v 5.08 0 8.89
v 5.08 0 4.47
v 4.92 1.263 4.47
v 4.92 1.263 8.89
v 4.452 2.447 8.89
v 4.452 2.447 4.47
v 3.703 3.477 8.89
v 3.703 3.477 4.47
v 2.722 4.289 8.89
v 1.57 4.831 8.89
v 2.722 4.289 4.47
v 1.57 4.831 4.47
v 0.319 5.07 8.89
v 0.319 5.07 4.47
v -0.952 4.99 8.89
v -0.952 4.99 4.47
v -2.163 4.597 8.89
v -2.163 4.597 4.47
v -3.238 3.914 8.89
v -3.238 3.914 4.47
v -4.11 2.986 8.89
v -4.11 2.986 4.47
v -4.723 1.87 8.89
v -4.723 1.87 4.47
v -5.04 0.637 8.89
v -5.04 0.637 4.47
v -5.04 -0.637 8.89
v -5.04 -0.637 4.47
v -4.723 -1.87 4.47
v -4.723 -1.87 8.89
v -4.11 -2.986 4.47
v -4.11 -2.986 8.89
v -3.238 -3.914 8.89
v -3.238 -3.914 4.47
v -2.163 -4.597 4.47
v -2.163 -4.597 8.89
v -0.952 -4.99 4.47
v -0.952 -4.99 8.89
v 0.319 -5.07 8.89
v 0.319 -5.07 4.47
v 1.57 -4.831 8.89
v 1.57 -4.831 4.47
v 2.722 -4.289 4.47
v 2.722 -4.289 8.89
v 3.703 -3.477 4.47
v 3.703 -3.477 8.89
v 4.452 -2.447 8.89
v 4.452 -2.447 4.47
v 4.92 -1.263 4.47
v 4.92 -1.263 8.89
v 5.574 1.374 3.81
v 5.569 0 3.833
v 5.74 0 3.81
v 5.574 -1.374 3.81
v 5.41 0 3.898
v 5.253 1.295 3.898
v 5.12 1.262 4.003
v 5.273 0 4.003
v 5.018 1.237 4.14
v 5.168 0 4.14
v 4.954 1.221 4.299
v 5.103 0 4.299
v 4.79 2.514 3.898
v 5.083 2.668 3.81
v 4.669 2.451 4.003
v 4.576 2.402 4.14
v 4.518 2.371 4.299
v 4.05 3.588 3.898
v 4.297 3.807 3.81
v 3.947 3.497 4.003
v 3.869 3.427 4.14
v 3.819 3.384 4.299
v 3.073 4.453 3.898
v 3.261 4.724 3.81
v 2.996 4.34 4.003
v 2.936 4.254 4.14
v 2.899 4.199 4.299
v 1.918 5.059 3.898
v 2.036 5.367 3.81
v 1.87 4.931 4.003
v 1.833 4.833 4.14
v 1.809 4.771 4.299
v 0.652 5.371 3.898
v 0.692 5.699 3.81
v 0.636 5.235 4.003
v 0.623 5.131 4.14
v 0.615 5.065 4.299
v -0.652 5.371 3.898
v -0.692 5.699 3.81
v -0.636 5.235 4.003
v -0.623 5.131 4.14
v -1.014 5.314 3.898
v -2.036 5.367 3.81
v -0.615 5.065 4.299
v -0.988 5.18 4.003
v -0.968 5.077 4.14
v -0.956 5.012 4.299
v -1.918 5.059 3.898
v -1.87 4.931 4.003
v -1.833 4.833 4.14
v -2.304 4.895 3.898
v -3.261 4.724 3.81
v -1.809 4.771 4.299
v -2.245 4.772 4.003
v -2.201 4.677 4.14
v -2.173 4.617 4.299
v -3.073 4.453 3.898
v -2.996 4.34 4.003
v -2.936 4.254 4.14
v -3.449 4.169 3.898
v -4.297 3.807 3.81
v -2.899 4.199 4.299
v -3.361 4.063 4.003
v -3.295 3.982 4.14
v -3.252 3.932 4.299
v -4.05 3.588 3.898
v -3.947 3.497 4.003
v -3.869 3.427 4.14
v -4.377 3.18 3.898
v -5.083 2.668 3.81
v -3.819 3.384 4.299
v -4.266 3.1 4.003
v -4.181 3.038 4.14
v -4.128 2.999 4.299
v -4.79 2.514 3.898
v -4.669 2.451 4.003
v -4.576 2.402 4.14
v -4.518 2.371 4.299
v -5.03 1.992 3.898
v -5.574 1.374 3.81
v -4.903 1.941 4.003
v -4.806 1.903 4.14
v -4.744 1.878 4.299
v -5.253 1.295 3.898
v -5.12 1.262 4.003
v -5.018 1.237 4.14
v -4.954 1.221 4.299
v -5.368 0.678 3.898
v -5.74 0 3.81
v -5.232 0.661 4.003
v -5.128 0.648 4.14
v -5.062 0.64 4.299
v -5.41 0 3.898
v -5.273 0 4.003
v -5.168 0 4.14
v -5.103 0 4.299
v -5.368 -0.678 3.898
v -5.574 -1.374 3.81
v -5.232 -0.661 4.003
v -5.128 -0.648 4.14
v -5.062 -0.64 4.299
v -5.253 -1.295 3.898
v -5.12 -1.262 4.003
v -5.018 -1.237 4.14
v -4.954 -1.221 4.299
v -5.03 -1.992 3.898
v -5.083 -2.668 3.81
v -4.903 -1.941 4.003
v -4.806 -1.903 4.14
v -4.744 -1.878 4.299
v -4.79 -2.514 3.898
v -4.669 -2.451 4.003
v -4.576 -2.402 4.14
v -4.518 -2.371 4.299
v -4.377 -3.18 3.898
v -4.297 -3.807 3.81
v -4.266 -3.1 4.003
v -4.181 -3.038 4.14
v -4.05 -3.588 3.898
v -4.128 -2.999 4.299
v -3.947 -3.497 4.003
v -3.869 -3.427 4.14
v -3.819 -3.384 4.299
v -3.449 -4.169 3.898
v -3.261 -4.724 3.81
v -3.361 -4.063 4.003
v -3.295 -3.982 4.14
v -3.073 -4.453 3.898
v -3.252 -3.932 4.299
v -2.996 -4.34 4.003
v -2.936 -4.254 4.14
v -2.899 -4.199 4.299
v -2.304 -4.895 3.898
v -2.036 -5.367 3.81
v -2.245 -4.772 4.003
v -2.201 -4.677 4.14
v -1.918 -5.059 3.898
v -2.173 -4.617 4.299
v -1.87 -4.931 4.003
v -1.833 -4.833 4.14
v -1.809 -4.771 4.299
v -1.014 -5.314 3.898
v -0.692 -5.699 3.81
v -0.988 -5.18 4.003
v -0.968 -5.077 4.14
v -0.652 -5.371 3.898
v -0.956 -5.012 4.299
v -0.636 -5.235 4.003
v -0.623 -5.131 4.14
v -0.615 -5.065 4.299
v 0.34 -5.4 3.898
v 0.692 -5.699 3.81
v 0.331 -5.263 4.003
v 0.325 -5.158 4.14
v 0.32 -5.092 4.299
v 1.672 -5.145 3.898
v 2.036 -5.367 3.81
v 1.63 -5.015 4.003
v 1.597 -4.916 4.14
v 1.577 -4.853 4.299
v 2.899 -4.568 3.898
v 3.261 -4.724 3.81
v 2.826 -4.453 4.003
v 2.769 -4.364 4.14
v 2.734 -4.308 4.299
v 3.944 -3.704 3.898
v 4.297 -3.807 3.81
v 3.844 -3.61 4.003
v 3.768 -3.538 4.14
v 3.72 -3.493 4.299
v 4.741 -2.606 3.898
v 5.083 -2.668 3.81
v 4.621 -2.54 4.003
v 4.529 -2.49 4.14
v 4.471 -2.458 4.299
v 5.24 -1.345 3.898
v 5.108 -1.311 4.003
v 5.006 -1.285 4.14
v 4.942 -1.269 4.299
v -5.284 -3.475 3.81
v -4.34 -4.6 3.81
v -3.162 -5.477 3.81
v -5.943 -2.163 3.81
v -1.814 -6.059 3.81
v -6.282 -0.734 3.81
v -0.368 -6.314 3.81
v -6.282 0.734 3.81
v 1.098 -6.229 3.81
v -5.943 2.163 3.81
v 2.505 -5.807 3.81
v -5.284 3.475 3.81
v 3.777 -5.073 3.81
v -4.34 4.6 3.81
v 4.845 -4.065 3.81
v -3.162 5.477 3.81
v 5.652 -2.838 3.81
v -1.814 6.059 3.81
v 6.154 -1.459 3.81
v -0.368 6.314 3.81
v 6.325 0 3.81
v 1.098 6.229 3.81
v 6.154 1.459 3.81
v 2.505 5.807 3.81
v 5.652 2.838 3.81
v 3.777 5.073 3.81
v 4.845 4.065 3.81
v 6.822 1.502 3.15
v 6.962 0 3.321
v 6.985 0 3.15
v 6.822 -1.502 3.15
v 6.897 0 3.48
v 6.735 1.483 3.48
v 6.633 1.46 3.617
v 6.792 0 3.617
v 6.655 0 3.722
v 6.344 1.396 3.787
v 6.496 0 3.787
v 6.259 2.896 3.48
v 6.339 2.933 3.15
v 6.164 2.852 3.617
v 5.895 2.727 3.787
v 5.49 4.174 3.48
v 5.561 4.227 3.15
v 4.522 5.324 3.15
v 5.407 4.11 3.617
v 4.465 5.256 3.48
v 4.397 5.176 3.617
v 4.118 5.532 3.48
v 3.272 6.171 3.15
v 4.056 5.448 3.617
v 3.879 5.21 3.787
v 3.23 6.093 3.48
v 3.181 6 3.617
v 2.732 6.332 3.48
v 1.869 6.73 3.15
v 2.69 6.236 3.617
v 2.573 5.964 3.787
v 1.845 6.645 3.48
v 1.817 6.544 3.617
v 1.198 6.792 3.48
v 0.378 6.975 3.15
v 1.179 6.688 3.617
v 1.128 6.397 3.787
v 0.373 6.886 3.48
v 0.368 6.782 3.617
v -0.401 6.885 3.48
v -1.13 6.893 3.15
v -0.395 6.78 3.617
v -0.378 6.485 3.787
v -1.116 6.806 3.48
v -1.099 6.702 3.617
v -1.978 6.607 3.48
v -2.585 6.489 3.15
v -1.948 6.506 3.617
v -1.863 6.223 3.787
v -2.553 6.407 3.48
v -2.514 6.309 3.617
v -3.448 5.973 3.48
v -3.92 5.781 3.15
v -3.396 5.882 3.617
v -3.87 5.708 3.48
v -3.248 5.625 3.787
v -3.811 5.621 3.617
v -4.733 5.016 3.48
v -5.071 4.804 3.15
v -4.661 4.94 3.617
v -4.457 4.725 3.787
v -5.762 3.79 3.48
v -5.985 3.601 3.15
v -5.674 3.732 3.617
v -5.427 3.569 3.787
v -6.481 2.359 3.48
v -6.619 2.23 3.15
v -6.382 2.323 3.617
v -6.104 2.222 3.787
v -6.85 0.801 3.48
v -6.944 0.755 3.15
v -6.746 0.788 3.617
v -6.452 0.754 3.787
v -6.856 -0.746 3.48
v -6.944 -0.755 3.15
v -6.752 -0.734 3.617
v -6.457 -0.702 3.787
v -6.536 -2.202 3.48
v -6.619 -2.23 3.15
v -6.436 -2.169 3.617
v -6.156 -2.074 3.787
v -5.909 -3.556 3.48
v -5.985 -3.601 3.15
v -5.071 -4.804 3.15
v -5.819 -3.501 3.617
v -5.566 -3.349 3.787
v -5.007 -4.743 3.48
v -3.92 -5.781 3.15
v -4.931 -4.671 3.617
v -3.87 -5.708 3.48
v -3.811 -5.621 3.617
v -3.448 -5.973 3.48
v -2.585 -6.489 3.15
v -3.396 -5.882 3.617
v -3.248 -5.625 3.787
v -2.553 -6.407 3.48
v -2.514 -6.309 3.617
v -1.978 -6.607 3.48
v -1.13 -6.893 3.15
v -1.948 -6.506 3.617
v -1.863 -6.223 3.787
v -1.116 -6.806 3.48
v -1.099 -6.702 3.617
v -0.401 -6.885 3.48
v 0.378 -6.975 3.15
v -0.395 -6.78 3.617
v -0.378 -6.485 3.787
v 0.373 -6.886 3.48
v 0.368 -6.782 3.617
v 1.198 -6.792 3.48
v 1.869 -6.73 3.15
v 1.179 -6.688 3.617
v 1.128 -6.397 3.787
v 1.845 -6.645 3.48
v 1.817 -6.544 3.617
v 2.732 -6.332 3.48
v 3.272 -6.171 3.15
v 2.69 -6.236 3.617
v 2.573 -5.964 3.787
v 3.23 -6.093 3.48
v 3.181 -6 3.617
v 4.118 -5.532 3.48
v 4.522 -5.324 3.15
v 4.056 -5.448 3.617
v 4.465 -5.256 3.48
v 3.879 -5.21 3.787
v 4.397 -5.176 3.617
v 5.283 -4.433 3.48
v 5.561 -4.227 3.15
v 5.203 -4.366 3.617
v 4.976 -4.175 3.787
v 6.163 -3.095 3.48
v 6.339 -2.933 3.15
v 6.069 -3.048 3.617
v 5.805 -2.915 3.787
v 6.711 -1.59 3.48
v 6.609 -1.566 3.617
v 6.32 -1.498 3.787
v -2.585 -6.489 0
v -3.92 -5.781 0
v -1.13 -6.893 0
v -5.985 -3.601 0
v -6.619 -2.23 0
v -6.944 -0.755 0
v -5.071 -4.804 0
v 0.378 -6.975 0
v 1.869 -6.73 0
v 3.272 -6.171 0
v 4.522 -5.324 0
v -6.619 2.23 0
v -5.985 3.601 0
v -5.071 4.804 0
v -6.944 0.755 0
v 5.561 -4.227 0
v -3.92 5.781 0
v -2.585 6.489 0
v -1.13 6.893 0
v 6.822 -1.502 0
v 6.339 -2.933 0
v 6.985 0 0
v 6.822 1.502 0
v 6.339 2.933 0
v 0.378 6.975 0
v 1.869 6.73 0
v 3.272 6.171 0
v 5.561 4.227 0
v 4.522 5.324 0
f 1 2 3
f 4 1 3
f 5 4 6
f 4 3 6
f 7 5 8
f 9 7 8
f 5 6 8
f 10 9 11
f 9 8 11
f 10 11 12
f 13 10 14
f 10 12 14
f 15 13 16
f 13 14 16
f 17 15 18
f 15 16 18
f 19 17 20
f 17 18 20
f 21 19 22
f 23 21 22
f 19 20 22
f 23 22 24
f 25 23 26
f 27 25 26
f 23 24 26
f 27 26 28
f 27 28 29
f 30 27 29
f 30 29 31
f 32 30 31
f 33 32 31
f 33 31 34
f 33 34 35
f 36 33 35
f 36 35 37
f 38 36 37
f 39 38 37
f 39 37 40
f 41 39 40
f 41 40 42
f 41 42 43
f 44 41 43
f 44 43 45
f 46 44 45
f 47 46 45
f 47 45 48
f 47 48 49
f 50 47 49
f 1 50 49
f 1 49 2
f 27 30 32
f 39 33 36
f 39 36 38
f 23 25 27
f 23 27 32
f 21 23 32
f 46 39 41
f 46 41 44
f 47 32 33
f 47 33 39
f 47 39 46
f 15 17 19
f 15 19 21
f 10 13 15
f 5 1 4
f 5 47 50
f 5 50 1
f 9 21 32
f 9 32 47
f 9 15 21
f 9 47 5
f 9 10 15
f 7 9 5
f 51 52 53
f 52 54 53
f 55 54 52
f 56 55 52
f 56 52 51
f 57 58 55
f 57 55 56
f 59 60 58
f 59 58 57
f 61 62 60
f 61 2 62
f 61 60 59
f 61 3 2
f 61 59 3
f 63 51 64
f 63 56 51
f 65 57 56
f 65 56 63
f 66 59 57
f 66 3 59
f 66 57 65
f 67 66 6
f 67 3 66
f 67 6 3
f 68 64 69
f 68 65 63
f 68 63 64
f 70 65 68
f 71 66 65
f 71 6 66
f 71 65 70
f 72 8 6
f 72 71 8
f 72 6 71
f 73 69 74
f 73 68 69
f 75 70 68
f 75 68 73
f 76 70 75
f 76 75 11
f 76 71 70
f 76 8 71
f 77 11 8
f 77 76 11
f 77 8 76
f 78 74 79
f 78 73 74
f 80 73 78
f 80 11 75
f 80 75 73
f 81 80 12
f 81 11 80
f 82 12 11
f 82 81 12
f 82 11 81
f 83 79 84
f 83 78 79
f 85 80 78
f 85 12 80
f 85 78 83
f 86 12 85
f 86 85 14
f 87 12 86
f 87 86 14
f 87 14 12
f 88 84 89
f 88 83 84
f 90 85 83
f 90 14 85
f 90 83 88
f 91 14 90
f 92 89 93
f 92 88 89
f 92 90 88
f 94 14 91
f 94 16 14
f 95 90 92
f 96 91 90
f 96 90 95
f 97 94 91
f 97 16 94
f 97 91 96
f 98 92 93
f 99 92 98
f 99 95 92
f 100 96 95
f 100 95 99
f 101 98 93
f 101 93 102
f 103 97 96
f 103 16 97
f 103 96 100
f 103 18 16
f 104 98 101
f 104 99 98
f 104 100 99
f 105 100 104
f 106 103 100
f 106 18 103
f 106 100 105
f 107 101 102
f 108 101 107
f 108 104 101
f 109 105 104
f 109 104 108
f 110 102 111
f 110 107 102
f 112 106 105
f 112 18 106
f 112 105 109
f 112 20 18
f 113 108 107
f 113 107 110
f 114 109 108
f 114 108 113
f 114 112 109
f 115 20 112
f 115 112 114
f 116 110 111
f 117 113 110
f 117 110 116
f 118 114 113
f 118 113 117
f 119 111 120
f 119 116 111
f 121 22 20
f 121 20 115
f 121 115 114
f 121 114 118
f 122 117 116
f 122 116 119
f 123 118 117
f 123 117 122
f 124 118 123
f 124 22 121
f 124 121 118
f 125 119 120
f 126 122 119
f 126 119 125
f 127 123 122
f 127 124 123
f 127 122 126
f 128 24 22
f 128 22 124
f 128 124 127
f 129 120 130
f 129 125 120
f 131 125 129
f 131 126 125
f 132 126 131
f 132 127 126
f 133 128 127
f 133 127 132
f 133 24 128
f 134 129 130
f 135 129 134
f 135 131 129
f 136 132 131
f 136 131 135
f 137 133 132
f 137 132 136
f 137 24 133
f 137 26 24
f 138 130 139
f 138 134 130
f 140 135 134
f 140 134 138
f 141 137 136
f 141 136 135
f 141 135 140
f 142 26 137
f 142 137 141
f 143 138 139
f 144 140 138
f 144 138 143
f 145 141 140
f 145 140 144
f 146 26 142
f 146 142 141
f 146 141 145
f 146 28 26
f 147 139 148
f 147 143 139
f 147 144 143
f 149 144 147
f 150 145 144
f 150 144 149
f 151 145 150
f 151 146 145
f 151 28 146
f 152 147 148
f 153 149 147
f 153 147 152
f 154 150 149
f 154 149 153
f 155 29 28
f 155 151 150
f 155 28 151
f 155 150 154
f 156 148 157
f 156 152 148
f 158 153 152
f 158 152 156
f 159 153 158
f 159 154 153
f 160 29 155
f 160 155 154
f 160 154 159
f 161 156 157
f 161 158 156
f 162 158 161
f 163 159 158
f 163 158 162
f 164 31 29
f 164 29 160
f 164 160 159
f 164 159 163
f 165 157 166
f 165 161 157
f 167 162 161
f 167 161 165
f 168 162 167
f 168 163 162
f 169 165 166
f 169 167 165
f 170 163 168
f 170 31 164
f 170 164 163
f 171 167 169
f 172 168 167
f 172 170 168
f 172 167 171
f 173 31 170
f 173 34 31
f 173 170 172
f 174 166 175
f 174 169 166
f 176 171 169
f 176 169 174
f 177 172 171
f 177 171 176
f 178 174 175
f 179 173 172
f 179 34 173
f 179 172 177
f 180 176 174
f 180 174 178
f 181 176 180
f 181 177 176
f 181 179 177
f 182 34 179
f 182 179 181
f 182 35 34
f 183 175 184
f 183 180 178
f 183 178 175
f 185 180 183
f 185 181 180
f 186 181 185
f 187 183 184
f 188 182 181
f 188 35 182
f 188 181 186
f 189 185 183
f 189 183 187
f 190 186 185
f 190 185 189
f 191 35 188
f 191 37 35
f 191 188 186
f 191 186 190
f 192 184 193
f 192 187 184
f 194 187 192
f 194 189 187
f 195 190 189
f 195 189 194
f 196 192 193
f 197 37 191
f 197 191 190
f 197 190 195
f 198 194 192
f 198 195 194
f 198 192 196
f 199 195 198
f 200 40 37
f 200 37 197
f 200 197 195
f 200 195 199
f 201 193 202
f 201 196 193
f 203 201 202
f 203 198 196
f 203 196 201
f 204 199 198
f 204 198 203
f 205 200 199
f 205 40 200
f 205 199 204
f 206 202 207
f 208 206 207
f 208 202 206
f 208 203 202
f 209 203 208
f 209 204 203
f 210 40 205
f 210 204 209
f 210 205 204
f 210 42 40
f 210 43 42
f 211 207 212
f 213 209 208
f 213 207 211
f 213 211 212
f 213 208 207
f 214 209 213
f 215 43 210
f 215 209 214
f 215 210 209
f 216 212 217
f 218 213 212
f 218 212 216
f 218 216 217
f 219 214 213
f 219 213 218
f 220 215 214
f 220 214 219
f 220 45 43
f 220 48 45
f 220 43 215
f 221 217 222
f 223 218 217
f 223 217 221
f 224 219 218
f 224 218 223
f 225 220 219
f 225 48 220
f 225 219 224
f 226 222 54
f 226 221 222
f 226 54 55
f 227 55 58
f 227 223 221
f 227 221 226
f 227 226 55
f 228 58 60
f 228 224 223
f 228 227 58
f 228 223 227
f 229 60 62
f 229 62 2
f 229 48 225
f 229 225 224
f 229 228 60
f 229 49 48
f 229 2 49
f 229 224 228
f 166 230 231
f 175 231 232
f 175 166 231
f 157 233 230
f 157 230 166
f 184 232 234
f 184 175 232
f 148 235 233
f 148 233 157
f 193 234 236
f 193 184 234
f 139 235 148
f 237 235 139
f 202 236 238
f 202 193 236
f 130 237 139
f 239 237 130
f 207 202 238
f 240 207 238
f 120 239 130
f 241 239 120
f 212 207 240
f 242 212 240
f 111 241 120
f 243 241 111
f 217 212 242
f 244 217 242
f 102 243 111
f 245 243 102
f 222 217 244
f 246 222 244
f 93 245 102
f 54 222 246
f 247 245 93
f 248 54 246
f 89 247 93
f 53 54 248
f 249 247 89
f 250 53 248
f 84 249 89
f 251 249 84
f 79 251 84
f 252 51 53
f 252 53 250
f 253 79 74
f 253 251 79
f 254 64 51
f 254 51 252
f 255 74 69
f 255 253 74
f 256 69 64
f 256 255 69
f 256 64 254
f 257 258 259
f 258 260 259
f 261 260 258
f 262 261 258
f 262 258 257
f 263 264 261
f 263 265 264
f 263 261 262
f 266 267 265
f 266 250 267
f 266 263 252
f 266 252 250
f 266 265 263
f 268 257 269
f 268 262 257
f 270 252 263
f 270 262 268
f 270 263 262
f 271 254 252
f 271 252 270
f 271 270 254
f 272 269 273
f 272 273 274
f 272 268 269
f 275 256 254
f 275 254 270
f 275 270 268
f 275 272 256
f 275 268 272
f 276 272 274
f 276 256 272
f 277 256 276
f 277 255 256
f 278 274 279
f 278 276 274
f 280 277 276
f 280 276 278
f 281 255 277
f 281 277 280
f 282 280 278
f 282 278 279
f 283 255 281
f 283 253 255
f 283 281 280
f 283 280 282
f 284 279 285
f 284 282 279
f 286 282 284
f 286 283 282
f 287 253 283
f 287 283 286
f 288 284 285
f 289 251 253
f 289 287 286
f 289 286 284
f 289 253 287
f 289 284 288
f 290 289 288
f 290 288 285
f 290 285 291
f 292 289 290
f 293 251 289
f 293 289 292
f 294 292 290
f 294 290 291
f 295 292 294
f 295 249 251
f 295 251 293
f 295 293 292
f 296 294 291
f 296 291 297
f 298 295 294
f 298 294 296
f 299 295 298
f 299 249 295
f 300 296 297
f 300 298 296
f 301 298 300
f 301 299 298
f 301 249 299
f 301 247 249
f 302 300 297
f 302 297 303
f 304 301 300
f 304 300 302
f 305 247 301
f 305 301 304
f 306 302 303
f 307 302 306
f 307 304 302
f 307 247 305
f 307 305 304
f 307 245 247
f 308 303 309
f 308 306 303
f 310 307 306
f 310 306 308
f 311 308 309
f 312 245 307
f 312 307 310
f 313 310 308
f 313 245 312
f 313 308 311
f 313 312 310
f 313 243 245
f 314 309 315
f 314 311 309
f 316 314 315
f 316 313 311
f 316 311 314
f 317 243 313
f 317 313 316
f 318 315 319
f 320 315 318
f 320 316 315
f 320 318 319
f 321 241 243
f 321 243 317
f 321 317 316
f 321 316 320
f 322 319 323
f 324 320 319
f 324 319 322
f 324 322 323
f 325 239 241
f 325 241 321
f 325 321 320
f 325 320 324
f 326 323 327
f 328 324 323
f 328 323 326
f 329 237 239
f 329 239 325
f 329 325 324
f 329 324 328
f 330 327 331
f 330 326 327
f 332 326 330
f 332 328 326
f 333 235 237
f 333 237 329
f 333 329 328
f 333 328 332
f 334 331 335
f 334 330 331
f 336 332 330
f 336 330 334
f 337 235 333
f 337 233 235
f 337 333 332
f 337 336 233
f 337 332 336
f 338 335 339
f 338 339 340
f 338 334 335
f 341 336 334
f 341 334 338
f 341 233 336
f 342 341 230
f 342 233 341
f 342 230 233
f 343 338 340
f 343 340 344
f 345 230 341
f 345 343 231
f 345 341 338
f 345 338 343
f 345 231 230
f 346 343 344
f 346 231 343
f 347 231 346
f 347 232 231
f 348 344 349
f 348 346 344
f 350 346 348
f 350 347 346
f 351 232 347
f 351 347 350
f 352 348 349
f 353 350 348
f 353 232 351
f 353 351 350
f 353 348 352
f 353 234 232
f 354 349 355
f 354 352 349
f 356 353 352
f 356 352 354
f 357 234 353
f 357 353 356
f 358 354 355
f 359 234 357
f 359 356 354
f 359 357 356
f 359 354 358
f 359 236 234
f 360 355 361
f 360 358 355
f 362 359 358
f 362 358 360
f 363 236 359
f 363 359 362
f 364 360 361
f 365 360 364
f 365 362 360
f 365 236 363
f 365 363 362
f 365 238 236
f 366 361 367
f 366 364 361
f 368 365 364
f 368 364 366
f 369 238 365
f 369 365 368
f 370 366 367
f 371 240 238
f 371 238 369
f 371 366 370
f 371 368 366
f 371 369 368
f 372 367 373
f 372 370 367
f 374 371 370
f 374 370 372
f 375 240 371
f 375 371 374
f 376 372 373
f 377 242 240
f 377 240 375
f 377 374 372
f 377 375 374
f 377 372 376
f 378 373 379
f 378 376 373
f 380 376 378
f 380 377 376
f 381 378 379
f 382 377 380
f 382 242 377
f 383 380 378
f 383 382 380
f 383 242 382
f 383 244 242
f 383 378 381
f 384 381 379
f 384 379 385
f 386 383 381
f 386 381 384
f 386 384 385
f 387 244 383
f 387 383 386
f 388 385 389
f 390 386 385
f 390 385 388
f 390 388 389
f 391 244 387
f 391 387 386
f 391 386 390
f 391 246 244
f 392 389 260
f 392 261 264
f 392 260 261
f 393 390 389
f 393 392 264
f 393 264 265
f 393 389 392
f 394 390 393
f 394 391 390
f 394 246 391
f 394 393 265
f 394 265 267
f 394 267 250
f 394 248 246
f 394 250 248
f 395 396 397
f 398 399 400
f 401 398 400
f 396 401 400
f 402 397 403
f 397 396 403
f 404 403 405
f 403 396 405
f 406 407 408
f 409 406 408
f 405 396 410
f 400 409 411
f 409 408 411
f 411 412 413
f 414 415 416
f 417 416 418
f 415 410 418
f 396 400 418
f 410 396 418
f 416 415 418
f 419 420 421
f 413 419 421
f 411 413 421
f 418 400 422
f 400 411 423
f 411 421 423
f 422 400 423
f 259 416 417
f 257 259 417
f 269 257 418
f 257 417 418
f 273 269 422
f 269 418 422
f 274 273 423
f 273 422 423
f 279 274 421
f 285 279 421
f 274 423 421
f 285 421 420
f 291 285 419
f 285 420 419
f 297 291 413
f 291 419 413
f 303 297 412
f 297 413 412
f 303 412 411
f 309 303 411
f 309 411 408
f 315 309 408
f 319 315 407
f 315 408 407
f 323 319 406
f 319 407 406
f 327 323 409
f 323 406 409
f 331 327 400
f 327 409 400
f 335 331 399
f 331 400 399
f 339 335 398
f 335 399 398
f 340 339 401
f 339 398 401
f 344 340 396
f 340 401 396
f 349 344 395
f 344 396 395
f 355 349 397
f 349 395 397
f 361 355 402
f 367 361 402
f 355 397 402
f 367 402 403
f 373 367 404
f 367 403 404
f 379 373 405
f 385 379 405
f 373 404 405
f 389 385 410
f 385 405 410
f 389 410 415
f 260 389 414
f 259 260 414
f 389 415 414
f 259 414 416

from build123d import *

# Parameters (mm, degrees)
F0_R     = 5.08
F1_DEPTH = 8.89
F0_R_2   = 6.985
F2_DEPTH = 3.81
F3_R     = 0.6604


with BuildPart() as f1:
    # F0 (on Top) → F1 (new body)
    with BuildSketch(Plane.XY):
        Circle(F0_R)
    extrude(amount=F1_DEPTH)

    # F0 (on Top) → F2 (join)
    with BuildSketch(Plane.XY):
        Circle(F0_R_2)
        Circle(F0_R, mode=Mode.SUBTRACT)
    extrude(amount=F2_DEPTH)

    # F3
    f3_edges = [f1.edges().sort_by_distance(p)[0] for p in [
        (-6.985, 0, 3.81),
        (-5.08, 0, 3.81),
    ]]
    fillet(f3_edges, radius=F3_R)


solid = f1.part
